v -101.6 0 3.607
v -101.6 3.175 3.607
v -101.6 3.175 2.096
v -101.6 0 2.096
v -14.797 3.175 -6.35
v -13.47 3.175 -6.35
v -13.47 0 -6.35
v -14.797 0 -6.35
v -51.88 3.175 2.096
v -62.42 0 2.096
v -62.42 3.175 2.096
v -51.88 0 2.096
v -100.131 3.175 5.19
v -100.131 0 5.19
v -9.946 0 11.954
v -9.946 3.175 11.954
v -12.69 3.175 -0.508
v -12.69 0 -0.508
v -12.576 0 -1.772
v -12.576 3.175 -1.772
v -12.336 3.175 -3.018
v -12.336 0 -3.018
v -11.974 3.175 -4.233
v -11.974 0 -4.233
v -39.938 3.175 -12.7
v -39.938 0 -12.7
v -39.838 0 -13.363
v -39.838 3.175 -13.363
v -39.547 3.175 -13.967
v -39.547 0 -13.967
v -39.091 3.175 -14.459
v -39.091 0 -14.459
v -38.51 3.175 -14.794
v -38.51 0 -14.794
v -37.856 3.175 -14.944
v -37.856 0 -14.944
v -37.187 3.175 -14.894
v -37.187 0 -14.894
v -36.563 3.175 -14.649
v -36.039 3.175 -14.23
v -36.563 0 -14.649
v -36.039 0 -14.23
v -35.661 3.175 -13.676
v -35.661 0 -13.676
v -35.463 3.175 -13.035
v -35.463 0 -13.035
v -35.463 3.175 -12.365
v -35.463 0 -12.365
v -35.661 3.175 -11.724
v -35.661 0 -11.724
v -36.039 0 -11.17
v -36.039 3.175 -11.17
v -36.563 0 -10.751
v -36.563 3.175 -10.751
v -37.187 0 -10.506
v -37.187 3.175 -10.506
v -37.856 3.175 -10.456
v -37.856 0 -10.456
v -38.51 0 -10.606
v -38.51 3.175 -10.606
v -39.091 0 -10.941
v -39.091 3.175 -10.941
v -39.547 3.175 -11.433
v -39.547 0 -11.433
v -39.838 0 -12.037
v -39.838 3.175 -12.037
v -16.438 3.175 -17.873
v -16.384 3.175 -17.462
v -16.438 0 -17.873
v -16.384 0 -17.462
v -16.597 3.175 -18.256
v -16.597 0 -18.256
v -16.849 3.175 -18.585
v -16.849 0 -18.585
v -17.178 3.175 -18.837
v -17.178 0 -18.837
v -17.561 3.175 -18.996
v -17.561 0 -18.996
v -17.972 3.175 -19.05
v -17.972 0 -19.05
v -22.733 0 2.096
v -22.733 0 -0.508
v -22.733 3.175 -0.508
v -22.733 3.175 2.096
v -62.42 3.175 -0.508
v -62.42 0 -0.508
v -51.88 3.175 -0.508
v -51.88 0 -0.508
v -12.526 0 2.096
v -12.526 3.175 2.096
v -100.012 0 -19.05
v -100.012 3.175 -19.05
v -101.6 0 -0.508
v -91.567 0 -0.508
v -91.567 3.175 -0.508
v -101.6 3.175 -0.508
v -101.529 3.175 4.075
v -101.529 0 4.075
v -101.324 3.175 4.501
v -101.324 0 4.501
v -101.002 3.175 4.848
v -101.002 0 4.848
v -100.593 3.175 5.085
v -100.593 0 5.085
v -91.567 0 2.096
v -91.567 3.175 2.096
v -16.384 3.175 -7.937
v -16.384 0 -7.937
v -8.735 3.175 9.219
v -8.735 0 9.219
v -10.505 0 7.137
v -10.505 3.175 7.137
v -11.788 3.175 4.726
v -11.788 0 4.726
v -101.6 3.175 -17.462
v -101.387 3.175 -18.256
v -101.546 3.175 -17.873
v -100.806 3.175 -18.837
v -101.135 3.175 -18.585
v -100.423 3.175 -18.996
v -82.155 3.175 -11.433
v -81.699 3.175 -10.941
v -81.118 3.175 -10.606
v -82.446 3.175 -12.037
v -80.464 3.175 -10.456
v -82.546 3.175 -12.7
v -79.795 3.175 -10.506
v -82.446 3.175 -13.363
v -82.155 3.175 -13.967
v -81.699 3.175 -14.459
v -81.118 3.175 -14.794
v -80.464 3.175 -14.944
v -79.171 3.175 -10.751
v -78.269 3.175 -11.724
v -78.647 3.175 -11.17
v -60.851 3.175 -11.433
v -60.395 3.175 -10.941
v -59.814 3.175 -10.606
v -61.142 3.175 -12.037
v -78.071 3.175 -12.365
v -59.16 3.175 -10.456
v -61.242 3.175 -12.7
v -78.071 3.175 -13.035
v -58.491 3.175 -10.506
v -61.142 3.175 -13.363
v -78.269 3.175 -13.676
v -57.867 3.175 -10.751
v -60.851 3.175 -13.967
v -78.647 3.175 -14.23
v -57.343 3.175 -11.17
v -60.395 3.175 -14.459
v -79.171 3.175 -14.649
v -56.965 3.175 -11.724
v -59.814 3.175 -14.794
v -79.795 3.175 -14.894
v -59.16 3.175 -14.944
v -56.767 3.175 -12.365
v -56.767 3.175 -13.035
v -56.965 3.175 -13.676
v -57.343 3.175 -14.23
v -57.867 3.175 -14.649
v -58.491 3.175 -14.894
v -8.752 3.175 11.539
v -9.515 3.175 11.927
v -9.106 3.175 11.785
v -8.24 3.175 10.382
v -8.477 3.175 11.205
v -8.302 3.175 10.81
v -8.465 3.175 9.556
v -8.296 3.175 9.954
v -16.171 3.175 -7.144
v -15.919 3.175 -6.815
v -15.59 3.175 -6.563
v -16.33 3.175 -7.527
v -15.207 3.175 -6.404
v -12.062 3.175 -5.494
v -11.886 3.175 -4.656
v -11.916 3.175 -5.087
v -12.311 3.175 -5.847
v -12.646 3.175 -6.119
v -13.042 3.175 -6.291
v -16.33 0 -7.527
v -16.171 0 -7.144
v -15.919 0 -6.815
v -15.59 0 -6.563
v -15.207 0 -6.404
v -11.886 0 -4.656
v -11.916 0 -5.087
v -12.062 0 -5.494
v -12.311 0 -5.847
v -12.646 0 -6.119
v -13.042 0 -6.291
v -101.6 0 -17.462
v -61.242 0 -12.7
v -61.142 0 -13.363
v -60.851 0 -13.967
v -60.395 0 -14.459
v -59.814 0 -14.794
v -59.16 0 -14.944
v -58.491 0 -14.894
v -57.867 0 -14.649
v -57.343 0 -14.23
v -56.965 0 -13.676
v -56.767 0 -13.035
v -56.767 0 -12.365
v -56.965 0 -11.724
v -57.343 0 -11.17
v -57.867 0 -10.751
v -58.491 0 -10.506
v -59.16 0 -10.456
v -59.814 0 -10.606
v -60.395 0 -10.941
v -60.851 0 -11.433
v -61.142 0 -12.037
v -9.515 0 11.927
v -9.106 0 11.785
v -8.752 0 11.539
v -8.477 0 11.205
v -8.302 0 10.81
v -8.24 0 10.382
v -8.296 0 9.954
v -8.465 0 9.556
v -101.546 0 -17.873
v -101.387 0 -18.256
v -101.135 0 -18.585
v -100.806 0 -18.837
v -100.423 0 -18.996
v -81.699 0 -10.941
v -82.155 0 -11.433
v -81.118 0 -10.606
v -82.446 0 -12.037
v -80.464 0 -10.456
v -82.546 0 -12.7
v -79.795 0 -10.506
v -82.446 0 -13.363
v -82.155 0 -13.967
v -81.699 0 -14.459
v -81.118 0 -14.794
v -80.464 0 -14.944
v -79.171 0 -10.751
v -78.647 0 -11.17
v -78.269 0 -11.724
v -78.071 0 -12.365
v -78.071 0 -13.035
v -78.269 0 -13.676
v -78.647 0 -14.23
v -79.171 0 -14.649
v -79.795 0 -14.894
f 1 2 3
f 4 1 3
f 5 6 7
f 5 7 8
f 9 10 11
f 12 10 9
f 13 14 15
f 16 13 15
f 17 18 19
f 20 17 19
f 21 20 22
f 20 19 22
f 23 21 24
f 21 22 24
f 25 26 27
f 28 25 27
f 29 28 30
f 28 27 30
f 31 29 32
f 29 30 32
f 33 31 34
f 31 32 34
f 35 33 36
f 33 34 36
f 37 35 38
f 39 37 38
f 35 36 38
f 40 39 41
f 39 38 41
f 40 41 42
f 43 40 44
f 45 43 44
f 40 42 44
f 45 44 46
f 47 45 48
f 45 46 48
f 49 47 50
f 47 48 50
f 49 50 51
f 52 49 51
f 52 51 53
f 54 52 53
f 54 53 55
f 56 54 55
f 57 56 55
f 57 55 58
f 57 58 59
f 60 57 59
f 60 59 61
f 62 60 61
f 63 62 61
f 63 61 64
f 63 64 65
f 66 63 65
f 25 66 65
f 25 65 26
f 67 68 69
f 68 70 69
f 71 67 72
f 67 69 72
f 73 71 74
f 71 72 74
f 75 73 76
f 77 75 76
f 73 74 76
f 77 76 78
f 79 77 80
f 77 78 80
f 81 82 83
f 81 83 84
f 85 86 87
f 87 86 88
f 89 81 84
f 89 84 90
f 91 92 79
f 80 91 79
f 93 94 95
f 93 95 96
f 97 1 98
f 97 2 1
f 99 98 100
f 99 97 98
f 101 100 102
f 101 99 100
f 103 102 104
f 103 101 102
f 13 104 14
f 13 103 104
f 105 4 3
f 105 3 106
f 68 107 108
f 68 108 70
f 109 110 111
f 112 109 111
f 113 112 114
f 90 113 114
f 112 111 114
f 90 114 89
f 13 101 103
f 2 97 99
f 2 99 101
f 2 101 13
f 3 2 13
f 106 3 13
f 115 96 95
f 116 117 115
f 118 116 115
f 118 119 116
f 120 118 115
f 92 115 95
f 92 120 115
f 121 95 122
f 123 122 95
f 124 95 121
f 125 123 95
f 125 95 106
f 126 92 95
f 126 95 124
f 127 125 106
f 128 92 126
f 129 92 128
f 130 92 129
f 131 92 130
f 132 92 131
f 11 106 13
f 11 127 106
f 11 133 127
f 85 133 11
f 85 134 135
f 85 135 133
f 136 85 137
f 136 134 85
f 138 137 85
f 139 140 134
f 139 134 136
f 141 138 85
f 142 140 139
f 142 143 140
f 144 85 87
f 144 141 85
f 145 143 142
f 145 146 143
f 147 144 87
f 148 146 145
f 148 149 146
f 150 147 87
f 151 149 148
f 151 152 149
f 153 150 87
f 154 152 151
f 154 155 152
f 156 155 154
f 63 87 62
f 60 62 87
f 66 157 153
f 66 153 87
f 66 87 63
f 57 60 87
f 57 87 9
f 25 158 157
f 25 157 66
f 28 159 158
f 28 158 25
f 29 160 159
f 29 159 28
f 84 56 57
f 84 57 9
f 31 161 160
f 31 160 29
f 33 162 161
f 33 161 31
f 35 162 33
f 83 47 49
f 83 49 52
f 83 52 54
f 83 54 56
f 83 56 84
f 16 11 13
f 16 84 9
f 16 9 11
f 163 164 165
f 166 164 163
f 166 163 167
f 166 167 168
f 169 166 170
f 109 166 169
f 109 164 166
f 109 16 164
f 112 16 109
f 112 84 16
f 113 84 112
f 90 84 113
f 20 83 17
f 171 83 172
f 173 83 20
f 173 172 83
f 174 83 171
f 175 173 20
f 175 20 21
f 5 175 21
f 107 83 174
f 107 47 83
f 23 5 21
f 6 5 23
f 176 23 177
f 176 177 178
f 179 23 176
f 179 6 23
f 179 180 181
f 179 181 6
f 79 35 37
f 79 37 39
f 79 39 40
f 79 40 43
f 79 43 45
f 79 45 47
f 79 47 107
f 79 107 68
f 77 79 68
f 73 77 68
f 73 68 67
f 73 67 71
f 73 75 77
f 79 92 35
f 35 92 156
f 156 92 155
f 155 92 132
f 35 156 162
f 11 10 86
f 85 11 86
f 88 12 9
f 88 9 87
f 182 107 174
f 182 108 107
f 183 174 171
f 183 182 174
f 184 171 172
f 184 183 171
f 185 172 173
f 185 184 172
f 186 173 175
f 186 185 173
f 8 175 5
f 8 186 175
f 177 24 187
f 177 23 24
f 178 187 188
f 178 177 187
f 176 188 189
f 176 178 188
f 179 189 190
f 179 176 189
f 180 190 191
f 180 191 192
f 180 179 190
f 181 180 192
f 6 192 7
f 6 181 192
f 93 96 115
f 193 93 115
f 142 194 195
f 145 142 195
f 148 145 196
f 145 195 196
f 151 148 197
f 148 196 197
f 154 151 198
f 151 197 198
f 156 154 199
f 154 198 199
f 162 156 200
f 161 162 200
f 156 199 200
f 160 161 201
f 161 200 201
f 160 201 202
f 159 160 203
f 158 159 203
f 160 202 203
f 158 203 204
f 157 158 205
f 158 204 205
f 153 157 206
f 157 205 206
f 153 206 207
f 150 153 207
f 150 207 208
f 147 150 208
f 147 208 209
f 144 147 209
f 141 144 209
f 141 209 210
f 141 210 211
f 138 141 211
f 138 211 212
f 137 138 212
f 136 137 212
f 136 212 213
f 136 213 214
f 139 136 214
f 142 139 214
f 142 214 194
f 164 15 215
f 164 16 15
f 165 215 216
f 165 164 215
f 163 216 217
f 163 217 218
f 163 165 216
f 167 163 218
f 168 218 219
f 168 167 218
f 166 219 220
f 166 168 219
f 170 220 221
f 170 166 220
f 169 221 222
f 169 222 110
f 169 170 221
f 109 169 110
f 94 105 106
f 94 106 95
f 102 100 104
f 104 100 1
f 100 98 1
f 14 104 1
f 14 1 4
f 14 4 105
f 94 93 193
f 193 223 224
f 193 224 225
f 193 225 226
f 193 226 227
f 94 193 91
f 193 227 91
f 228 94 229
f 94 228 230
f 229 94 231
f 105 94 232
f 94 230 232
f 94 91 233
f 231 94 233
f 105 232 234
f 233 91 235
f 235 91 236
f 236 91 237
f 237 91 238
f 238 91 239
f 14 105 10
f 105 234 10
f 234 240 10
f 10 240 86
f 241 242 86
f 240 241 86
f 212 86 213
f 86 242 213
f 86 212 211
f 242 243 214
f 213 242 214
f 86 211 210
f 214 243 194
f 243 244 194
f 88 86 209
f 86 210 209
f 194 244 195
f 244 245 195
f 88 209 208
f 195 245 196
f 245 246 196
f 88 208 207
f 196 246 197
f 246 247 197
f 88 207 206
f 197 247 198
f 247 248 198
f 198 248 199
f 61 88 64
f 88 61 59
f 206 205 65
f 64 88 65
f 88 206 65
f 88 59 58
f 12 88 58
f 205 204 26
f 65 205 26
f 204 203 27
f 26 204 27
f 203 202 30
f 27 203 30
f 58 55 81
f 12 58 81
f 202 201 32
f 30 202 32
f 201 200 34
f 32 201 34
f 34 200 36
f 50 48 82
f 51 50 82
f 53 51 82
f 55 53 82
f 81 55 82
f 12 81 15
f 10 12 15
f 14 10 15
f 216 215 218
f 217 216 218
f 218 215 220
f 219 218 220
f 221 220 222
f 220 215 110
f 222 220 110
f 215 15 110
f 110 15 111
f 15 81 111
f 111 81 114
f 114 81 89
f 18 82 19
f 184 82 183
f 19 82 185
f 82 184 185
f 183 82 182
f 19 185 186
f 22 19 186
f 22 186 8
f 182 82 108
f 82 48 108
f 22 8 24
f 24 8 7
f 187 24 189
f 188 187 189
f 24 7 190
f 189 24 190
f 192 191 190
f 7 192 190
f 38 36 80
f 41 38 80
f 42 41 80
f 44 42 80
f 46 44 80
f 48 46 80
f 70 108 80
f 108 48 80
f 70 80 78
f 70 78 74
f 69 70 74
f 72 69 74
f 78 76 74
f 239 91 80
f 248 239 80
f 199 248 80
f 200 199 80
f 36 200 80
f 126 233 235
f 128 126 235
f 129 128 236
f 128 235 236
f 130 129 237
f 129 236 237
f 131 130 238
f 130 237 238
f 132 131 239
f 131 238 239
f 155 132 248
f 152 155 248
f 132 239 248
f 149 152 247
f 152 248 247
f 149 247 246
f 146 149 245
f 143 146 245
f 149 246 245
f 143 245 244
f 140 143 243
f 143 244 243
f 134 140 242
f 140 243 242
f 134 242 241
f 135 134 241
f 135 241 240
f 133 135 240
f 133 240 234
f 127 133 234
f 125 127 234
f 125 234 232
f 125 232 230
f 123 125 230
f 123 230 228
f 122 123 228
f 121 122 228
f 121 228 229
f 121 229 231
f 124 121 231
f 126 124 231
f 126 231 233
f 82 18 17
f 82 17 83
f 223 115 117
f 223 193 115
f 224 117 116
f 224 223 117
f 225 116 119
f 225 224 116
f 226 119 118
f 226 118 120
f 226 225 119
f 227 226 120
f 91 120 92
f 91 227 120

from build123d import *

# Parameters (mm, degrees)
BOSS_EXTRUDE1_DEPTH  = 3.175
FILLET1_R            = 1.5875
SKETCH2_W            = 85.216
SKETCH2_H            = 12.7
BOSS_EXTRUDE2_DEPTH  = 3.175
FILLET2_R            = 1.5875
M4_CLEARANCE_HOLE1_D = 4.5
CUT_EXTRUDE1_START   = -3.175
SKETCH5_W            = 9.525
SKETCH5_H            = 1.5875
SKETCH5_W_2          = 10.541
SKETCH5_H_2          = 2.6035
CUT_EXTRUDE1_DEPTH   = 3.175


with BuildPart() as part:
    # Sketch1 → Boss-Extrude1 (new body)
    with BuildSketch(Plane(origin=(0, 0, 0), x_dir=(1, 0, 0), z_dir=(0, 1, 0))):
        with BuildLine():
            Line((-101.6, 0), (-101.6, -5.08))
            Line((-101.6, -5.08), (-1.894344313, -12.557924177))
            ThreePointArc((-1.894344313, -12.557924177), (-11.442635346, -5.50963668), (-10.998522628, 6.35))
            Line((-10.998522628, 6.35), (-101.6, 6.35))
            Line((-101.6, 6.35), (-101.6, 0))
        make_face()
    extrude(amount=BOSS_EXTRUDE1_DEPTH)

    # Fillet1
    fillet1_edges = [part.edges().sort_by_distance(p)[0] for p in [
        (-10.998522628, 1.5875, -6.35),
        (-1.894344313, 1.5875, 12.557924177),
    ]]
    fillet(fillet1_edges, radius=FILLET1_R)

    # Sketch2 → Boss-Extrude2 (add)
    with BuildSketch(Plane(origin=(0, 3.175, 0), x_dir=(1, 0, 0), z_dir=(0, 1, 0))):
        with Locations((-58.992, 12.7)):
            Rectangle(SKETCH2_W, SKETCH2_H)
    extrude(amount=-BOSS_EXTRUDE2_DEPTH)

    # Fillet2
    fillet2_edges = [part.edges().sort_by_distance(p)[0] for p in [
        (-101.6, 1.5875, -19.05),
        (-16.384, 1.5875, -19.05),
        (-16.384, 1.5875, -6.35),
        (-101.6, 1.5875, 5.08),
    ]]
    fillet(fillet2_edges, radius=FILLET2_R)

    # M4 Clearance Hole1 (through all)
    with Locations(Plane(origin=(0, 3.175, 0), x_dir=(1, 0, 0), z_dir=(0, 1, 0))):
        with Locations((-80.296, 12.7), (-58.992, 12.7), (-37.688, 12.7)):
            Hole(M4_CLEARANCE_HOLE1_D / 2)

    # Sketch5 → Cut-Extrude1 (cut)
    with BuildSketch(Plane(origin=(0, 3.175, 0), x_dir=(1, 0, 0), z_dir=(0, 1, 0)).offset(CUT_EXTRUDE1_START)):
        with Locations((-96.8375, -0.79375)):
            Rectangle(SKETCH5_W, SKETCH5_H)
        Polygon((-101.6, 0), (-92.075, 0), (-92.075, -1.5875), (-101.6, -1.5875), (-101.6, -2.0955), (-91.567, -2.0955), (-91.567, 0.508), (-101.6, 0.508), align=None)
        with Locations((-57.15, -0.79375)):
            Rectangle(SKETCH5_W_2, SKETCH5_H_2)
        with BuildLine():
            Line((-22.733, -2.0955), (-12.525928299, -2.0955))
            ThreePointArc((-12.525928299, -2.0955), (-12.674906095, -0.797969605), (-12.689835933, 0.508))
            Line((-12.689835933, 0.508), (-22.733, 0.508))
            Line((-22.733, 0.508), (-22.733, -2.0955))
        make_face()
    extrude(amount=CUT_EXTRUDE1_DEPTH, mode=Mode.SUBTRACT)


solid = part.part
